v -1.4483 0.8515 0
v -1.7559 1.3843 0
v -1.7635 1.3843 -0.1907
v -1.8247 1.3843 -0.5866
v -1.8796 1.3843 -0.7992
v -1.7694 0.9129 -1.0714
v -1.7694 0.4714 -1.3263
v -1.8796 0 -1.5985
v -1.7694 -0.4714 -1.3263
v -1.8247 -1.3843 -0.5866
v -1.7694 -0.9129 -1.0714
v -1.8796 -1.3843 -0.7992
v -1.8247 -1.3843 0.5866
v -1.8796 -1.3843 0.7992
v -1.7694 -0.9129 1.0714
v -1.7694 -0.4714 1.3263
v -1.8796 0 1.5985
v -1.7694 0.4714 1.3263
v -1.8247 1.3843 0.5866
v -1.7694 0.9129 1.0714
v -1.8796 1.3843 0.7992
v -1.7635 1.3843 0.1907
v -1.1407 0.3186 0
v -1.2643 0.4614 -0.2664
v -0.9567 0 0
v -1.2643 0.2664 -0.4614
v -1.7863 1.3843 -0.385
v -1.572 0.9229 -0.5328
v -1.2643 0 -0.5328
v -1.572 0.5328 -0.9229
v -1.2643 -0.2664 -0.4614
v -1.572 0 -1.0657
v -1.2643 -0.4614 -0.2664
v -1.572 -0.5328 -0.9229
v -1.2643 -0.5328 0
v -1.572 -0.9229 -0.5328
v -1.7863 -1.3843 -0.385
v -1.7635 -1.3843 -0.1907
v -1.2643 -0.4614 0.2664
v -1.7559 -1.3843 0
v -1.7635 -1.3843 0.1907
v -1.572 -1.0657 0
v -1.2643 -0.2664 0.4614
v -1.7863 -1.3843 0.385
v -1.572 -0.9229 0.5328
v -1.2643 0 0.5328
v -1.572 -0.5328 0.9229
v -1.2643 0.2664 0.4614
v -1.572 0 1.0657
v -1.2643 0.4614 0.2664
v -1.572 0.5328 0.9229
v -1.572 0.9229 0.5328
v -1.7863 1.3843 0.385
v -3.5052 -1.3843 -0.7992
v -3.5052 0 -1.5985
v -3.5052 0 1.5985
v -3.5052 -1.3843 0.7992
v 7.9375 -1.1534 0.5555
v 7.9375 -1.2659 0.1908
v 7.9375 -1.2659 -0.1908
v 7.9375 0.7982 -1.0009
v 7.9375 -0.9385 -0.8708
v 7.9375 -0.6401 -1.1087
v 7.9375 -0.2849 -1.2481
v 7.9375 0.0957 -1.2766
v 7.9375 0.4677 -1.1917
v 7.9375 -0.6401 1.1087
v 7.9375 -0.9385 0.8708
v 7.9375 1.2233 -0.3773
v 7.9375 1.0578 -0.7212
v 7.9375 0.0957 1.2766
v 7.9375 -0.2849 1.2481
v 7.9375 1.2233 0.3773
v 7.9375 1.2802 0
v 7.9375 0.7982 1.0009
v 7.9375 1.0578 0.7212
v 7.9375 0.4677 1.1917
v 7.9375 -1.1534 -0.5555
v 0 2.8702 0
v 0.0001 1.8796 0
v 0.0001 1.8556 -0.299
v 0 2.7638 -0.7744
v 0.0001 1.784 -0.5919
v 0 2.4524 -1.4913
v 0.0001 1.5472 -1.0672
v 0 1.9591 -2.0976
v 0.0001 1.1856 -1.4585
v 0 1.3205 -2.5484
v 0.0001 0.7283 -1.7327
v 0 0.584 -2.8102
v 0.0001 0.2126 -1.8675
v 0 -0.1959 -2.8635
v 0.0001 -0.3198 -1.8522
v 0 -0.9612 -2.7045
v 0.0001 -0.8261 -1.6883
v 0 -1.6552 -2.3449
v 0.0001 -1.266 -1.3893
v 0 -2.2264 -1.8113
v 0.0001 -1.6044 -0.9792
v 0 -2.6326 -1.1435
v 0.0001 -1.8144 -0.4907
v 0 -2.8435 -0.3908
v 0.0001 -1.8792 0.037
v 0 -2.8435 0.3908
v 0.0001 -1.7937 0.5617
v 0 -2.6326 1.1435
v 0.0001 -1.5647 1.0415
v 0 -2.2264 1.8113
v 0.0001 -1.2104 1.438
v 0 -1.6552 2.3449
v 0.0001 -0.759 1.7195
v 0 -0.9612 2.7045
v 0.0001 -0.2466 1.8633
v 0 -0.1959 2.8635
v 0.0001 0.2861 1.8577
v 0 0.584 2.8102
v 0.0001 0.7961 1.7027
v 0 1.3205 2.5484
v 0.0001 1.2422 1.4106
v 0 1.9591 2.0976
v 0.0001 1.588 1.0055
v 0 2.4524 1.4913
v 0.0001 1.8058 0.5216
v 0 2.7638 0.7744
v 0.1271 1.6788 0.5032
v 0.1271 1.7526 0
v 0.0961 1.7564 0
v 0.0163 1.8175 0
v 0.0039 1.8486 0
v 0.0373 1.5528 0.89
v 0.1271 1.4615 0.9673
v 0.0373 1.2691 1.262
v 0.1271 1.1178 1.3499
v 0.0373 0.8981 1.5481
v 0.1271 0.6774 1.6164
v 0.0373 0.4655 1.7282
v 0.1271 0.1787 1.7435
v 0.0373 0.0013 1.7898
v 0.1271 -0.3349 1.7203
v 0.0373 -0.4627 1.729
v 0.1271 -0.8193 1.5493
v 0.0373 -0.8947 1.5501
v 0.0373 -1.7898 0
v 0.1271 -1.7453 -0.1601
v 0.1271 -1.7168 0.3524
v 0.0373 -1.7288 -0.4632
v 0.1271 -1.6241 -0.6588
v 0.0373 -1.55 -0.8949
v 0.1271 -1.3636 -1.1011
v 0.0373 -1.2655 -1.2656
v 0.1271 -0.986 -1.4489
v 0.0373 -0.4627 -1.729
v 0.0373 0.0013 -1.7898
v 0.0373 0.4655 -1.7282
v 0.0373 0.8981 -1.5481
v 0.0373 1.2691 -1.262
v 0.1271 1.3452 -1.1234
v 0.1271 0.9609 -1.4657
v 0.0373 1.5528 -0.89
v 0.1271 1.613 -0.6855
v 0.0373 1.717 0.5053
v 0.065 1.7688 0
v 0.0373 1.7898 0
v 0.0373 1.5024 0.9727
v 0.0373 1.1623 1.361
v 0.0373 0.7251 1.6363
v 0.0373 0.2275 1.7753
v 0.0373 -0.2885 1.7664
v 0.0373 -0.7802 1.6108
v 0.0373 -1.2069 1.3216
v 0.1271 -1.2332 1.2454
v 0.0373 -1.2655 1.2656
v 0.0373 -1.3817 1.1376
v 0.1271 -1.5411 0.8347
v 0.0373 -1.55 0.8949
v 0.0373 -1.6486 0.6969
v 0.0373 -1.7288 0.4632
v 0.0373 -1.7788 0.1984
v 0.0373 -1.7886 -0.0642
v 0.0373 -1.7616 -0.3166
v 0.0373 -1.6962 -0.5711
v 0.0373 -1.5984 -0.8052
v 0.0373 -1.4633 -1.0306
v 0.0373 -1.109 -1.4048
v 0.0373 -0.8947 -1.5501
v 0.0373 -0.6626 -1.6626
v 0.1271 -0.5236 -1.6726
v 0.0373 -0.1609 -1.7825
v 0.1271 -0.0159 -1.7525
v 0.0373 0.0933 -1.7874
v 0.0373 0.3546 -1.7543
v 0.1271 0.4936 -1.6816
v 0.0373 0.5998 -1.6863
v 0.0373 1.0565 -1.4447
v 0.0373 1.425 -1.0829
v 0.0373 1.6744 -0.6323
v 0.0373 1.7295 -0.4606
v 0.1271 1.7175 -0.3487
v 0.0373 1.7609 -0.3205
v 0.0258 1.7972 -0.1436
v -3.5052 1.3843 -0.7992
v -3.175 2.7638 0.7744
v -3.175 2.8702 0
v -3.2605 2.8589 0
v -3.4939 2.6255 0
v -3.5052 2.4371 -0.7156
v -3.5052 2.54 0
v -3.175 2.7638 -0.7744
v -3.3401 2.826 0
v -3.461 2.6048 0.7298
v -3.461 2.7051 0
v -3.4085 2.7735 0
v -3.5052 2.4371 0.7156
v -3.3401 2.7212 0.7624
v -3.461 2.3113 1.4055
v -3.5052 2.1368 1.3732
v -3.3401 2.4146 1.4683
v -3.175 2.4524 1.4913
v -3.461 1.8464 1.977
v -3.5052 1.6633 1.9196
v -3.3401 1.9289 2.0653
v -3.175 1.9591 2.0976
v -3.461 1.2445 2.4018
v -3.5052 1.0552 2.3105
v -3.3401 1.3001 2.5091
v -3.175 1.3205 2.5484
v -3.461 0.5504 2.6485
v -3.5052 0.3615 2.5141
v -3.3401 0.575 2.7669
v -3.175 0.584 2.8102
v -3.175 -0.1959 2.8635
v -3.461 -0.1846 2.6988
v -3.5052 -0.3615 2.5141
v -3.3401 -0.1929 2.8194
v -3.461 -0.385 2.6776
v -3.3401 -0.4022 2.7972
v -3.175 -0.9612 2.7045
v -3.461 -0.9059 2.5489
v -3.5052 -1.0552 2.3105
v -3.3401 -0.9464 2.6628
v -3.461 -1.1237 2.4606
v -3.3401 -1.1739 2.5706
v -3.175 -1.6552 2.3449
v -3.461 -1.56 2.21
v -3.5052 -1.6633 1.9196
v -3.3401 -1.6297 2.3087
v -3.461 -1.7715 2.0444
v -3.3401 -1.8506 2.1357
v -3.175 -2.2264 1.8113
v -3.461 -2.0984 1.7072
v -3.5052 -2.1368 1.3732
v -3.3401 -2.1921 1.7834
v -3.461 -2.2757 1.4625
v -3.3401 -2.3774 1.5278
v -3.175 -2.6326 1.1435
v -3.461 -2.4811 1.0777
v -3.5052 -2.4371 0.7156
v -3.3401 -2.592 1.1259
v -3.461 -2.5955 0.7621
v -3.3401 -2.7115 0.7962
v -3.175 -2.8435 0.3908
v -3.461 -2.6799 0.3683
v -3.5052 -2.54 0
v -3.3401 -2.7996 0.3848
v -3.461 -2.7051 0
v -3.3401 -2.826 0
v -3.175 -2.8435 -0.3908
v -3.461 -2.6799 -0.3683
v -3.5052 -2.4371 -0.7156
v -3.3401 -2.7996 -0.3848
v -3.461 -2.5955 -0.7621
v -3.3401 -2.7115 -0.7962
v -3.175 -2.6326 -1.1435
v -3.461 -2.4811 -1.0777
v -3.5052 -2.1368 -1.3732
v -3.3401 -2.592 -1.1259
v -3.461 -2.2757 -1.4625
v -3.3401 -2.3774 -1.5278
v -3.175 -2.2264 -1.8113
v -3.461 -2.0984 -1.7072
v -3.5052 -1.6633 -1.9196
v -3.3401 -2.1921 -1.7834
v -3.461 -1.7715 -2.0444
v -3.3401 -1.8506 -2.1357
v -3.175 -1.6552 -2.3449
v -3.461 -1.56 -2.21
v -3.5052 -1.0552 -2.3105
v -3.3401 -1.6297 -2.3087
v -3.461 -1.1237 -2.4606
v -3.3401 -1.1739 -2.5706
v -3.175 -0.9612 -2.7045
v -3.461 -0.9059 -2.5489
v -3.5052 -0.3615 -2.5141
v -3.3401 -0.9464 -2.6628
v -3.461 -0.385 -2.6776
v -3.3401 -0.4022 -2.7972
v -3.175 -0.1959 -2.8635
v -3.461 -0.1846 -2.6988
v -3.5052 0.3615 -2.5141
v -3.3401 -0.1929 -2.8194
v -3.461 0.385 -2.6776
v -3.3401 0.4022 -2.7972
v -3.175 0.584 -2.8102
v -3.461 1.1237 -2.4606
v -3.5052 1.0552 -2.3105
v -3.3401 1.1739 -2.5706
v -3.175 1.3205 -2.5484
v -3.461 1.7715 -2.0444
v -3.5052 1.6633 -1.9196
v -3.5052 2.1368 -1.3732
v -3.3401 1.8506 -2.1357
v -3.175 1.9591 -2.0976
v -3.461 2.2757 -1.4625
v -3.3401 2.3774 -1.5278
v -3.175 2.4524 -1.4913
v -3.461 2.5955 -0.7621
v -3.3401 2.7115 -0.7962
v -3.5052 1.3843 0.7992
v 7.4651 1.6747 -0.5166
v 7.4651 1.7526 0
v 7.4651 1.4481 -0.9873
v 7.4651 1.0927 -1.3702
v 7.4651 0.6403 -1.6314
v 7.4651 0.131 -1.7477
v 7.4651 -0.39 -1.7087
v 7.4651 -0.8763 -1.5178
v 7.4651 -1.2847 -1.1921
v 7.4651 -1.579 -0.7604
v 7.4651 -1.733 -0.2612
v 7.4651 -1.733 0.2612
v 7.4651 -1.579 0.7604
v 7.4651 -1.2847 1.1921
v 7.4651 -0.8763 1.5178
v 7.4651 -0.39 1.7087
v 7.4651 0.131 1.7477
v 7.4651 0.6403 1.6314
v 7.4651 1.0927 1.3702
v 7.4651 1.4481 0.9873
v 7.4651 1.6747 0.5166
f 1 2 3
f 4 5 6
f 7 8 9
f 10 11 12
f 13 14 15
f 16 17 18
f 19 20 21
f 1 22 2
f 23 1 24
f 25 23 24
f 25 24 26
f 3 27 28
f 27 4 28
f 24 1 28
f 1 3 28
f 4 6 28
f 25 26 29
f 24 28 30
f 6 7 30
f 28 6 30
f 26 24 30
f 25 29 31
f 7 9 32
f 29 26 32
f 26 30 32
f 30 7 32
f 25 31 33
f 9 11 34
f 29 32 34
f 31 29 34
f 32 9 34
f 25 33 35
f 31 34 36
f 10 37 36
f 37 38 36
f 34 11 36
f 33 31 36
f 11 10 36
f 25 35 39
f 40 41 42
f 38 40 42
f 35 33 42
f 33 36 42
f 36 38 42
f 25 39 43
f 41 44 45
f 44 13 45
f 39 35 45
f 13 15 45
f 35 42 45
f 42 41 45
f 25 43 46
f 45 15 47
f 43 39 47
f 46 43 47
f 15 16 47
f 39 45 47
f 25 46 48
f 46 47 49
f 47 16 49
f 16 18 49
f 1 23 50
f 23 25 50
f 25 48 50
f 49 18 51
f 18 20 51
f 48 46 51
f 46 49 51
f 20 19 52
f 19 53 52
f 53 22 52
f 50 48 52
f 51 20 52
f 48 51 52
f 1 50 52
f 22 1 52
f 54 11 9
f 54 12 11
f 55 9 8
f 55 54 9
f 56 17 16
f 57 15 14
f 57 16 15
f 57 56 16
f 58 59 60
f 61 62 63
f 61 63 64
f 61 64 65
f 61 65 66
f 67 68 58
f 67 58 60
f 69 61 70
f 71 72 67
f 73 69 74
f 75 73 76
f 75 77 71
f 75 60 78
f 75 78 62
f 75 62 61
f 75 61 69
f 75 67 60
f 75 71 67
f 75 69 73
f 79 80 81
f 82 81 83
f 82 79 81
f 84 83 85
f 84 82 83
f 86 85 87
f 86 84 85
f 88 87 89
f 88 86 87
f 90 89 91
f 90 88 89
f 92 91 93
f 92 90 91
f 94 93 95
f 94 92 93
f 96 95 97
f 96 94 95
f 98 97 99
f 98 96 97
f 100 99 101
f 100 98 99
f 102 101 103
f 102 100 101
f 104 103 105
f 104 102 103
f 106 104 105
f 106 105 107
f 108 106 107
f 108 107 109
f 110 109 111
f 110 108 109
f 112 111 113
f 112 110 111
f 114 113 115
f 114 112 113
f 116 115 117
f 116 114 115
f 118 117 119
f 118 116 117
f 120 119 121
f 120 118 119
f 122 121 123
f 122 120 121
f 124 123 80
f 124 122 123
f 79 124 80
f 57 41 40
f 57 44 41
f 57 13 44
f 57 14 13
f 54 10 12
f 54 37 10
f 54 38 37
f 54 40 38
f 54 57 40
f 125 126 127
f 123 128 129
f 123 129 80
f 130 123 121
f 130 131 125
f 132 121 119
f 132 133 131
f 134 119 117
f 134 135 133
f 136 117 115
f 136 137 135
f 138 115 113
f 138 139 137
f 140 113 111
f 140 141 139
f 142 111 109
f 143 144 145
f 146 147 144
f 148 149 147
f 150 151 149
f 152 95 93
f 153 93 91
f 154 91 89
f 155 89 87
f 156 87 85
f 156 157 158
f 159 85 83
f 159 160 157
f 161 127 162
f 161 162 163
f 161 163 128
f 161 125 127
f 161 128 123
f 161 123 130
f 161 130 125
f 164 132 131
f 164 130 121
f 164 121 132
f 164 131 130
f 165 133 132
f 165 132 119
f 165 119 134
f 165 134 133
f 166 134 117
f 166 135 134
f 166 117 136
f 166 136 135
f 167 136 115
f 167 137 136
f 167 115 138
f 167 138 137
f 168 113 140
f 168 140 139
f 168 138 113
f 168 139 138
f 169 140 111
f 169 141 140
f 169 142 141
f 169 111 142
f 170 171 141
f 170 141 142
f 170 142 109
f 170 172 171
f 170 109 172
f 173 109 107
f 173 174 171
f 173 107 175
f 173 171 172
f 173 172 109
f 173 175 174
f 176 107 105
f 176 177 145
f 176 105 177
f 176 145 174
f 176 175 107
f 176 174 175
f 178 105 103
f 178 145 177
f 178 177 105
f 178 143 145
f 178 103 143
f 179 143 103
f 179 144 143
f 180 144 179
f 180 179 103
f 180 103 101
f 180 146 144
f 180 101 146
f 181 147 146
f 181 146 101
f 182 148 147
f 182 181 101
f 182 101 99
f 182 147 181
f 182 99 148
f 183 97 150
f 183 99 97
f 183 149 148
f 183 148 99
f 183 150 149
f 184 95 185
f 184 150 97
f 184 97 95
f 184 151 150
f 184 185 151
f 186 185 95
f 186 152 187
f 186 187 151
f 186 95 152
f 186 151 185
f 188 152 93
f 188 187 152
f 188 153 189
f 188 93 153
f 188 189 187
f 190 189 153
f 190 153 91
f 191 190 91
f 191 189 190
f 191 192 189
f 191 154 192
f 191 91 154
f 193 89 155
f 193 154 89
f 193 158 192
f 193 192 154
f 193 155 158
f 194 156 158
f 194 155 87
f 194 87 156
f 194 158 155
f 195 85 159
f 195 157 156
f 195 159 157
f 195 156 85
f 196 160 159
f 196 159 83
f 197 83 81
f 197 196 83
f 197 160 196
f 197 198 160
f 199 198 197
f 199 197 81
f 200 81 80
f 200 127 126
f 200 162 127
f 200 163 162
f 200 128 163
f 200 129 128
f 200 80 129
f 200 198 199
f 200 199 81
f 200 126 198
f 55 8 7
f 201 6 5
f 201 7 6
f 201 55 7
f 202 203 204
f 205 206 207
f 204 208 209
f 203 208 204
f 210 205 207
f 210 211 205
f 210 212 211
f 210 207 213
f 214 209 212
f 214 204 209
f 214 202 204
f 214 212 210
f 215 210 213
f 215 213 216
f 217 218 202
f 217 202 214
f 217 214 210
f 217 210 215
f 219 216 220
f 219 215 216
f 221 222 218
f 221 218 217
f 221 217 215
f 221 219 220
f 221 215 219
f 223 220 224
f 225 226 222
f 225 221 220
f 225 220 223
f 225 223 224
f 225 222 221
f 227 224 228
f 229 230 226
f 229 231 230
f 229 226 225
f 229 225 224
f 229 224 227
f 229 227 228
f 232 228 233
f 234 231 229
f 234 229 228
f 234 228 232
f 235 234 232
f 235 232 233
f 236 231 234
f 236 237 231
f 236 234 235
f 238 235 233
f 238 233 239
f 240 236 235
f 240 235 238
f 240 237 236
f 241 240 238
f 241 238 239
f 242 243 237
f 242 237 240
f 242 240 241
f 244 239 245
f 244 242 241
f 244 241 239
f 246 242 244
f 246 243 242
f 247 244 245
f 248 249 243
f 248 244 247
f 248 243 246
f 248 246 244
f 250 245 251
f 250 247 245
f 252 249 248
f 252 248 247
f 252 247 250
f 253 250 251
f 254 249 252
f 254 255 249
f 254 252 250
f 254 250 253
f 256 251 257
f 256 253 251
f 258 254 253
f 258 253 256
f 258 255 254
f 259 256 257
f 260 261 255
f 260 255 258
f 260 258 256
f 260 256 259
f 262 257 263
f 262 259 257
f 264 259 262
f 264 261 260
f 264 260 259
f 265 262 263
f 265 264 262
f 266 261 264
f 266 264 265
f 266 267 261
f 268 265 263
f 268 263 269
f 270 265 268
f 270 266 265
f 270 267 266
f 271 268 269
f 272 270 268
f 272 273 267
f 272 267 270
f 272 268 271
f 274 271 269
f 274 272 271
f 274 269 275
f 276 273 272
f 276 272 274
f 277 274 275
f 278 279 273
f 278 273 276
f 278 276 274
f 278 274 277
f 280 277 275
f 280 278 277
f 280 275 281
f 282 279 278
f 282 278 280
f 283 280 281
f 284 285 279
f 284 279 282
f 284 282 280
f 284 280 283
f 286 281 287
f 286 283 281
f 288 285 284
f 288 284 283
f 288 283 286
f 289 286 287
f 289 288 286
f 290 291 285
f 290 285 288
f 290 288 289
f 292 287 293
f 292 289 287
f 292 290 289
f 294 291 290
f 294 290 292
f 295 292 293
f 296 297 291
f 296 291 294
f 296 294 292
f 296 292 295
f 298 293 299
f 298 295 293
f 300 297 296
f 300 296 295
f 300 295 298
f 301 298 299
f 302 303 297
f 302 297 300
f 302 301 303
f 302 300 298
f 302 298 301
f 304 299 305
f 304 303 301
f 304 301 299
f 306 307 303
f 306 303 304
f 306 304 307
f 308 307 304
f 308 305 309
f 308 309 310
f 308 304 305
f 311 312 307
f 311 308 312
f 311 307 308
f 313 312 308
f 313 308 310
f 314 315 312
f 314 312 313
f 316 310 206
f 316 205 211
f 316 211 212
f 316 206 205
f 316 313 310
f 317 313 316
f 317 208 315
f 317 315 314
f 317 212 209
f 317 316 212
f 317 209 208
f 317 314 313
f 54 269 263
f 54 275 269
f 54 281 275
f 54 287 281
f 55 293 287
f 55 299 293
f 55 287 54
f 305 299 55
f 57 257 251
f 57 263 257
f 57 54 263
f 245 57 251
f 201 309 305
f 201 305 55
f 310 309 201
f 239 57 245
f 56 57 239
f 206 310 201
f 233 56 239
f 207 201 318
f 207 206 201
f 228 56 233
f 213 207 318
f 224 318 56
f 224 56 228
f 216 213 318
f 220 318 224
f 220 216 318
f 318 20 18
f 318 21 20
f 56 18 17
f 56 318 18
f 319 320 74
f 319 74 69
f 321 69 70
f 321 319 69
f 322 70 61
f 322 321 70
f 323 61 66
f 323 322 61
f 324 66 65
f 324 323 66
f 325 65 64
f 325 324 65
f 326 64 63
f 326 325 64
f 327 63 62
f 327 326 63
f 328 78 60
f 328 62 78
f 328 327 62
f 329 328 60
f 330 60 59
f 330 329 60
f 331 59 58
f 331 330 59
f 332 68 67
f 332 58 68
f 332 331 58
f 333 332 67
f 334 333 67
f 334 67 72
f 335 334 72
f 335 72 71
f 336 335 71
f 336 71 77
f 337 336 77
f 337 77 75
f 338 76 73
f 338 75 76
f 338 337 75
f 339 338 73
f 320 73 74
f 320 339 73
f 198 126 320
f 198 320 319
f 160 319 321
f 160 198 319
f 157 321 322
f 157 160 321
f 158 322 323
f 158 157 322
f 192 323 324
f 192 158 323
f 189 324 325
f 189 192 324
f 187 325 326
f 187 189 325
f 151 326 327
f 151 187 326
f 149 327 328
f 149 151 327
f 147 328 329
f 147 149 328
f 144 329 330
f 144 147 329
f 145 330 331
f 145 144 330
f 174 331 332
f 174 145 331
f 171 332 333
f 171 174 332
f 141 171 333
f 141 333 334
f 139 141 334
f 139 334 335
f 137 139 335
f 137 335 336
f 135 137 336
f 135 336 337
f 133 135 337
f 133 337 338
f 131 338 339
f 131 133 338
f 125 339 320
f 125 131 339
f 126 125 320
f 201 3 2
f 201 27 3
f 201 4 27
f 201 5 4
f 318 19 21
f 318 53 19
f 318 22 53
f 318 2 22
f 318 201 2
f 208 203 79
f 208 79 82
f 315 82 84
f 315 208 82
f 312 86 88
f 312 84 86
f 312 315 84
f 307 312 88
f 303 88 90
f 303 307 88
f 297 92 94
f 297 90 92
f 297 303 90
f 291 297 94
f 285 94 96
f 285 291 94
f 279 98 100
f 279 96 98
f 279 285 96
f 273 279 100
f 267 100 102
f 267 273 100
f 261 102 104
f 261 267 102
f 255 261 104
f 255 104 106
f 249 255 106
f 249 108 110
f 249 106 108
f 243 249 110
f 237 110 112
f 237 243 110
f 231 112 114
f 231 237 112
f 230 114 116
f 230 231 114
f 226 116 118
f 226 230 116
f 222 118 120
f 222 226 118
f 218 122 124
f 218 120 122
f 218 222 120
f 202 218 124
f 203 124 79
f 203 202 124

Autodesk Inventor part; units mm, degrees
ref_plane "YZ Plane" through (0, 0, 0) normal (1, 0, 0) x (0, 1, 0)
ref_plane "XZ Plane" through (0, 0, 0) normal (0, 1, 0) x (-1, 0, 0)
sketch "Sketch1" plane through (0, 0, 0) normal (0, 0, 1) x (1, 0, 0)
  line L0 (-0.9567, 0) -> (7.9375, 0)
  line L1 (7.9375, 0) -> (7.9375, 1.7526)
  line L2 (7.9375, 1.7526) -> (1.9847, 1.7526)
  line L3 (1.9847, 1.7526) -> (0.0001, 1.7526)
  line L4 (0.0001, 1.7526) -> (0, 1.7526)
  line L5 (0, 1.7526) -> (0, 2.8702)
  line L6 (0, 2.8702) -> (-3.5052, 2.8702)
  line L7 (-3.5052, 2.8702) -> (-3.5052, 1.5985)
  line L8 (-3.5052, 1.5985) -> (-1.8796, 1.5985)
  line L9 (-1.8796, 1.5985) -> (-0.9567, 0)
  line L10 (-5.7937, 0) -> (10.226, 0) projected
  line L11 (0, -0.574) -> (0, 3.4442) projected
  line L12 (1.9847, 1.7526) -> (0, 1.7526) construction
  dimension "d1" = 5.9528
  dimension "d2" = 1.9846
  dimension "d3" = 3.5052
  dimension "d4" = 1.6256
  dimension "d5" = 60
  dimension "d6" = 3.5052
  dimension "d7" = 3.5052
  dimension "d8" = 3.1969
  dimension "d9" = 5.7404
  dimension "d26" = 7.9375
revolve "Body" add sketch "Sketch1" angle 360 about axis through (-0.9567, 0, 0) along (1, 0, 0)
sketch "Sketch2" plane through (-3.5052, 0, 0) normal (-1, 0, 0) x (0, 0, 1)
  circle A0 centre (0, 0) radius 1.5985 projected
  line L0 (0, -4.0183) -> (0, 4.0183) projected
  line L1 (-4.0183, 0) -> (4.0183, 0) projected
  line L2 (1.5985, 0) -> (0.7992, -1.3843)
  line L3 (0.7992, -1.3843) -> (-0.7992, -1.3843)
  line L4 (-0.7992, -1.3843) -> (-1.5985, 0)
  line L5 (-1.5985, 0) -> (-0.7992, 1.3843)
  line L6 (-0.7992, 1.3843) -> (0.7992, 1.3843)
  line L7 (0.7992, 1.3843) -> (1.5985, 0)
extrude "Slot" add sketch "Sketch2" against normal up to next contours L7 A0 | A0 L2 | L6 L0 A0 | A0 L0 L3 | L0 L6 A0 | A0 L3 L0 | L4 A0 | A0 L5
fillet "Fillet1" radius 0.3302 1 edges at (-3.5052, -2.8702, 0)
thread "Thread" size "6-32 UNC" class "2A" standard "ANSI Unified Screw Threads" length 5.9528
chamfer "Chamfer1" distance 0.4724 distance2 0.4724 1 edges at (7.9375, -1.7526, 0) measured on face at (7.9375, -0.5672, -0.1398)
ref_plane "Work Plane1" through (29, 0, 0) normal (0, -1, 0) x (1, 0, 0)
fillet "Fillet2" radius 0.127 1 edges at (0.0001, -1.7526, 0)
equation "\"d1\" = GEL"
equation "\"d3\" = KOH"
equation "\"d4\" = INTI"
equation "\"d6\" = GD"
equation "\"d7\" = BDM"
equation "\"d8\" = 1.1547 * SW"
equation "\"d9\" = KOD"
equation "\"d26\" = NLG"
equation "\"d30\" = R"
equation "\"d17\" = RR"
equation "\"d13\" = GEL"
equation "\"d15\" = -0.5 * SPD + 0.5 * GD"
equation "\"d16\" = GUL"
equation "\"GD\" = 3.5052"
equation "\"NLG\" = 7.9375"
equation "\"GEL\" = 5.9528"
equation "\"KOD\" = 5.7404"
equation "\"KOH\" = 3.5052"
equation "\"INTI\" = 1.6256"
equation "\"GAL\" = 1.9845"
equation "\"GUL\" = 0.47244"
equation "\"BDM\" = 3.5052"
equation "\"SW\" = 2.7686"
equation "\"RR\" = 0.3302"
equation "\"SPD\" = 2.56032"
equation "\"R\" = 0.127"
equation "\"PHH\" = 0.127"
equation "\"GD1\" = SPD"
equation "\"THREADDIA\" = 3.5052"
equation "\"FAWI\" = 45deg"
equation "\"KOH1\" = 3.1496"
equation "\"NND\" = 3.5052"
equation "\"TOA\" = 30deg"
equation "\"E0\" = 1.155 * SW"
properties part number "ANSI B18.3 - No. 6 - 32 UNC - 5/16 HS HCS" material "Steel, Mild"
